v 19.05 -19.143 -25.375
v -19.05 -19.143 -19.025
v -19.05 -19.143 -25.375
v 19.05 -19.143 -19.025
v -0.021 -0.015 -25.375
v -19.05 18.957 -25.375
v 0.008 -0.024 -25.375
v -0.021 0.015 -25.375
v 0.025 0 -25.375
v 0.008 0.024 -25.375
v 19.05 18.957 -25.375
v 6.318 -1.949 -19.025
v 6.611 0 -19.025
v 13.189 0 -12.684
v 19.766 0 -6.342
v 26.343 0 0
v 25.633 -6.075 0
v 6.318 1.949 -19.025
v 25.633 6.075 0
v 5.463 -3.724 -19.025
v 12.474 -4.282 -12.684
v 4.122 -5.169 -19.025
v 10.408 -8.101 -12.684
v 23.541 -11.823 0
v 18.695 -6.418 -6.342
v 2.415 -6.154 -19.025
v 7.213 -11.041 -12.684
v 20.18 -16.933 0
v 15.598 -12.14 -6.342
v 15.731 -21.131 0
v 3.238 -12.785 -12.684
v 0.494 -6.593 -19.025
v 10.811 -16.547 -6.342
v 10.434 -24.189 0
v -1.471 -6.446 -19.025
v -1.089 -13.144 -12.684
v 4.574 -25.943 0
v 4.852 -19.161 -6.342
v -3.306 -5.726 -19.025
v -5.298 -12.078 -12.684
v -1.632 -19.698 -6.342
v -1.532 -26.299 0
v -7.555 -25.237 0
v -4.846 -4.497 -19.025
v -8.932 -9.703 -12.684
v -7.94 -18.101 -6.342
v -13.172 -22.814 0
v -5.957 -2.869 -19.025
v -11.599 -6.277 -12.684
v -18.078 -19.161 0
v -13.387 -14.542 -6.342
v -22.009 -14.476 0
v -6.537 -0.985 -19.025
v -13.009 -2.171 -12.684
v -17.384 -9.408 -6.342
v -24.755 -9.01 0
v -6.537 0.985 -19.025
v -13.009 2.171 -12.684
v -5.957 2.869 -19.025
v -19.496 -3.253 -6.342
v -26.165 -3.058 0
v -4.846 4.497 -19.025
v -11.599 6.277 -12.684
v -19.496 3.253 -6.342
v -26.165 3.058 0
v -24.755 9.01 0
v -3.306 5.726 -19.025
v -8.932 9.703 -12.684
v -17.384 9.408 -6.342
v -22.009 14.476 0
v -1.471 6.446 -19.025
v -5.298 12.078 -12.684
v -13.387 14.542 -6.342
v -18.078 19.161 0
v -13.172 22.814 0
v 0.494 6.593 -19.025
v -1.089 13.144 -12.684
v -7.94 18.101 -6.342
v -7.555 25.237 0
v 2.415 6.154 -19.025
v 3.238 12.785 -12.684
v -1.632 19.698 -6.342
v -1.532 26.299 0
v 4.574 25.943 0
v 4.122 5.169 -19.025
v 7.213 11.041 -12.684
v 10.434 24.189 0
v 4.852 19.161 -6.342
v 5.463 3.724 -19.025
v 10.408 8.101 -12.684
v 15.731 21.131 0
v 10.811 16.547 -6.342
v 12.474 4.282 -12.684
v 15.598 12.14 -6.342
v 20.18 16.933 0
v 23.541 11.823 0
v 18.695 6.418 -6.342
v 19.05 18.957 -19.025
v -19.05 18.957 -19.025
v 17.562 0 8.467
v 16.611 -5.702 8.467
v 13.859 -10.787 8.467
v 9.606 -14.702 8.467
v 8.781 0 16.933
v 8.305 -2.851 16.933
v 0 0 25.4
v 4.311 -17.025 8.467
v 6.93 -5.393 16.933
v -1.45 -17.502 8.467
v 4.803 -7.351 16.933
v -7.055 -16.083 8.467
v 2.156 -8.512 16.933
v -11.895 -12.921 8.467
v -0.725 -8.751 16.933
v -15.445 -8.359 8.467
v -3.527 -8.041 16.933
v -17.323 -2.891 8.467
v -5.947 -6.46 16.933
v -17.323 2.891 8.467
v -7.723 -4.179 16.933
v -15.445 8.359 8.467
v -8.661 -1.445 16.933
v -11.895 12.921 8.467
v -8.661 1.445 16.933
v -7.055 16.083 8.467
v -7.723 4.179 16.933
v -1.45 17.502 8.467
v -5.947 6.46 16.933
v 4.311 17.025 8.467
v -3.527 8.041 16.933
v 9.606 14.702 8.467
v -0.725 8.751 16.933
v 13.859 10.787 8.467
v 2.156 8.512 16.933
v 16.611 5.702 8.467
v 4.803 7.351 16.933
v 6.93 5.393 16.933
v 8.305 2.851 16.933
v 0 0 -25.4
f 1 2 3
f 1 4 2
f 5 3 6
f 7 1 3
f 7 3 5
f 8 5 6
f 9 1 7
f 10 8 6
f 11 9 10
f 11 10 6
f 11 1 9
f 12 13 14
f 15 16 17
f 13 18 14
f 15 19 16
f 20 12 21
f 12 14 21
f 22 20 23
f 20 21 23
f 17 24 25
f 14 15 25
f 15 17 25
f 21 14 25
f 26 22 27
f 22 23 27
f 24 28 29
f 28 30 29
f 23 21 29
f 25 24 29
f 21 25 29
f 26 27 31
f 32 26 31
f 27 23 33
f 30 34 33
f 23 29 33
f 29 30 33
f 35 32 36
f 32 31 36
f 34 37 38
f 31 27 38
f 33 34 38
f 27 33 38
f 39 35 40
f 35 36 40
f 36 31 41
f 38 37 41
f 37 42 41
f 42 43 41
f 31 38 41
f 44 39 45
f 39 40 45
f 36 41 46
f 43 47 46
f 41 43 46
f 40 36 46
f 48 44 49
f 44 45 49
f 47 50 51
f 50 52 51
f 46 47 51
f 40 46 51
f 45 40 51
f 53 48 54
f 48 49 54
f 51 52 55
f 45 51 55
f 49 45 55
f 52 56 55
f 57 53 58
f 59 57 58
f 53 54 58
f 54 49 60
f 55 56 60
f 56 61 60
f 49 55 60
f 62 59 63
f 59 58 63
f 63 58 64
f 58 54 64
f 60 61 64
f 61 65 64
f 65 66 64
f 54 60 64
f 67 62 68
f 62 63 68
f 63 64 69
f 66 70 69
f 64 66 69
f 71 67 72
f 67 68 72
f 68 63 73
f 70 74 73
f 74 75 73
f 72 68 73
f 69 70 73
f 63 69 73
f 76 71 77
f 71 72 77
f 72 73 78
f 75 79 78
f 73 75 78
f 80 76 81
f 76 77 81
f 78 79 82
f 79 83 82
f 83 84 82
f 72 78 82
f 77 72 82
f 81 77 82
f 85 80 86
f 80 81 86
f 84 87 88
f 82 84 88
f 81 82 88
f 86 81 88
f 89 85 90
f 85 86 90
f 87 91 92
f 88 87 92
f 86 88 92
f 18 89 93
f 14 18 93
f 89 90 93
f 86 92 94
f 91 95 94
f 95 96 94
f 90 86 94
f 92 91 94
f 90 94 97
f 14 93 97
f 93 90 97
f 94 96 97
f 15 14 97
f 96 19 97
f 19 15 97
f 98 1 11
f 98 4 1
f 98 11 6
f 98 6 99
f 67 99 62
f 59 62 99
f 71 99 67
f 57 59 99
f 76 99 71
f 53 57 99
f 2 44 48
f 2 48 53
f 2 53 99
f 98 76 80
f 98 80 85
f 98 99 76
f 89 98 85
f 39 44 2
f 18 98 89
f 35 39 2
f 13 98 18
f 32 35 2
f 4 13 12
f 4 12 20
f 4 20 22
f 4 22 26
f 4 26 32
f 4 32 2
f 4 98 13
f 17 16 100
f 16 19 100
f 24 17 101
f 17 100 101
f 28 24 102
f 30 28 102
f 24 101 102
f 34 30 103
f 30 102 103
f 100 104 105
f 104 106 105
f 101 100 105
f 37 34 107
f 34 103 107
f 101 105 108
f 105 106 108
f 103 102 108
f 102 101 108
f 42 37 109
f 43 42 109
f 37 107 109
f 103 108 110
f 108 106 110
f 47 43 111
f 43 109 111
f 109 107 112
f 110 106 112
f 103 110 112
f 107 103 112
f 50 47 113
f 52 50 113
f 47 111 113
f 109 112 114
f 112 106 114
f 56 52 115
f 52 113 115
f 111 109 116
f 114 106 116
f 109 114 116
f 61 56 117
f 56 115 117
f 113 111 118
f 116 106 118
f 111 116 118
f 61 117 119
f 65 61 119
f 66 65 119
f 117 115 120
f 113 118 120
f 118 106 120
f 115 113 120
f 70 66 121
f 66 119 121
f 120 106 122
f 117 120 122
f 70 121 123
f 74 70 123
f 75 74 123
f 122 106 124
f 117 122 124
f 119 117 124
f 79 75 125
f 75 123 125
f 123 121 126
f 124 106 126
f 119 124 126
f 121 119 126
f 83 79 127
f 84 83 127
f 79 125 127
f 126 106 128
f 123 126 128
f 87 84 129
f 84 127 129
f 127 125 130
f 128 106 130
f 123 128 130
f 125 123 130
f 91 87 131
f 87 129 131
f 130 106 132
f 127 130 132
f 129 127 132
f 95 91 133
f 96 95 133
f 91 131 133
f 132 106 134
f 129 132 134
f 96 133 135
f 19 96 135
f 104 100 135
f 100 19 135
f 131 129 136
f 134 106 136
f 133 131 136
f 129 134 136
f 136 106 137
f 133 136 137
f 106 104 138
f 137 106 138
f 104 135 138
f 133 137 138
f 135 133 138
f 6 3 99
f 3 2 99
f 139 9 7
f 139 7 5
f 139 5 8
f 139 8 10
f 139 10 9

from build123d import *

# Parameters (mm, degrees)
F3_DEPTH      = 19.05
F3_DEPTH_BACK = 19.05


with BuildPart() as f1:
    # F0 (on Front) → F1 (revolve)
    with BuildSketch(Plane.XZ):
        Polygon((26.343262, 0), (0, 25.4), (0, -25.4), align=None)
    revolve(axis=Axis((0, 0, 0), (0, 0, -1)))

    # F2 (on Right) → F3 (join, two sides)
    with BuildSketch(Plane.YZ) as f3_sk:
        Polygon((-19.143354, -25.375442), (-0.093354, -25.375442), (18.956646, -25.375442), (18.956646, -19.025442), (-0.093354, -19.025442), (-19.143354, -19.025442), align=None)
    extrude(amount=F3_DEPTH)
    extrude(f3_sk.sketch, amount=-F3_DEPTH_BACK)


solid = f1.part
